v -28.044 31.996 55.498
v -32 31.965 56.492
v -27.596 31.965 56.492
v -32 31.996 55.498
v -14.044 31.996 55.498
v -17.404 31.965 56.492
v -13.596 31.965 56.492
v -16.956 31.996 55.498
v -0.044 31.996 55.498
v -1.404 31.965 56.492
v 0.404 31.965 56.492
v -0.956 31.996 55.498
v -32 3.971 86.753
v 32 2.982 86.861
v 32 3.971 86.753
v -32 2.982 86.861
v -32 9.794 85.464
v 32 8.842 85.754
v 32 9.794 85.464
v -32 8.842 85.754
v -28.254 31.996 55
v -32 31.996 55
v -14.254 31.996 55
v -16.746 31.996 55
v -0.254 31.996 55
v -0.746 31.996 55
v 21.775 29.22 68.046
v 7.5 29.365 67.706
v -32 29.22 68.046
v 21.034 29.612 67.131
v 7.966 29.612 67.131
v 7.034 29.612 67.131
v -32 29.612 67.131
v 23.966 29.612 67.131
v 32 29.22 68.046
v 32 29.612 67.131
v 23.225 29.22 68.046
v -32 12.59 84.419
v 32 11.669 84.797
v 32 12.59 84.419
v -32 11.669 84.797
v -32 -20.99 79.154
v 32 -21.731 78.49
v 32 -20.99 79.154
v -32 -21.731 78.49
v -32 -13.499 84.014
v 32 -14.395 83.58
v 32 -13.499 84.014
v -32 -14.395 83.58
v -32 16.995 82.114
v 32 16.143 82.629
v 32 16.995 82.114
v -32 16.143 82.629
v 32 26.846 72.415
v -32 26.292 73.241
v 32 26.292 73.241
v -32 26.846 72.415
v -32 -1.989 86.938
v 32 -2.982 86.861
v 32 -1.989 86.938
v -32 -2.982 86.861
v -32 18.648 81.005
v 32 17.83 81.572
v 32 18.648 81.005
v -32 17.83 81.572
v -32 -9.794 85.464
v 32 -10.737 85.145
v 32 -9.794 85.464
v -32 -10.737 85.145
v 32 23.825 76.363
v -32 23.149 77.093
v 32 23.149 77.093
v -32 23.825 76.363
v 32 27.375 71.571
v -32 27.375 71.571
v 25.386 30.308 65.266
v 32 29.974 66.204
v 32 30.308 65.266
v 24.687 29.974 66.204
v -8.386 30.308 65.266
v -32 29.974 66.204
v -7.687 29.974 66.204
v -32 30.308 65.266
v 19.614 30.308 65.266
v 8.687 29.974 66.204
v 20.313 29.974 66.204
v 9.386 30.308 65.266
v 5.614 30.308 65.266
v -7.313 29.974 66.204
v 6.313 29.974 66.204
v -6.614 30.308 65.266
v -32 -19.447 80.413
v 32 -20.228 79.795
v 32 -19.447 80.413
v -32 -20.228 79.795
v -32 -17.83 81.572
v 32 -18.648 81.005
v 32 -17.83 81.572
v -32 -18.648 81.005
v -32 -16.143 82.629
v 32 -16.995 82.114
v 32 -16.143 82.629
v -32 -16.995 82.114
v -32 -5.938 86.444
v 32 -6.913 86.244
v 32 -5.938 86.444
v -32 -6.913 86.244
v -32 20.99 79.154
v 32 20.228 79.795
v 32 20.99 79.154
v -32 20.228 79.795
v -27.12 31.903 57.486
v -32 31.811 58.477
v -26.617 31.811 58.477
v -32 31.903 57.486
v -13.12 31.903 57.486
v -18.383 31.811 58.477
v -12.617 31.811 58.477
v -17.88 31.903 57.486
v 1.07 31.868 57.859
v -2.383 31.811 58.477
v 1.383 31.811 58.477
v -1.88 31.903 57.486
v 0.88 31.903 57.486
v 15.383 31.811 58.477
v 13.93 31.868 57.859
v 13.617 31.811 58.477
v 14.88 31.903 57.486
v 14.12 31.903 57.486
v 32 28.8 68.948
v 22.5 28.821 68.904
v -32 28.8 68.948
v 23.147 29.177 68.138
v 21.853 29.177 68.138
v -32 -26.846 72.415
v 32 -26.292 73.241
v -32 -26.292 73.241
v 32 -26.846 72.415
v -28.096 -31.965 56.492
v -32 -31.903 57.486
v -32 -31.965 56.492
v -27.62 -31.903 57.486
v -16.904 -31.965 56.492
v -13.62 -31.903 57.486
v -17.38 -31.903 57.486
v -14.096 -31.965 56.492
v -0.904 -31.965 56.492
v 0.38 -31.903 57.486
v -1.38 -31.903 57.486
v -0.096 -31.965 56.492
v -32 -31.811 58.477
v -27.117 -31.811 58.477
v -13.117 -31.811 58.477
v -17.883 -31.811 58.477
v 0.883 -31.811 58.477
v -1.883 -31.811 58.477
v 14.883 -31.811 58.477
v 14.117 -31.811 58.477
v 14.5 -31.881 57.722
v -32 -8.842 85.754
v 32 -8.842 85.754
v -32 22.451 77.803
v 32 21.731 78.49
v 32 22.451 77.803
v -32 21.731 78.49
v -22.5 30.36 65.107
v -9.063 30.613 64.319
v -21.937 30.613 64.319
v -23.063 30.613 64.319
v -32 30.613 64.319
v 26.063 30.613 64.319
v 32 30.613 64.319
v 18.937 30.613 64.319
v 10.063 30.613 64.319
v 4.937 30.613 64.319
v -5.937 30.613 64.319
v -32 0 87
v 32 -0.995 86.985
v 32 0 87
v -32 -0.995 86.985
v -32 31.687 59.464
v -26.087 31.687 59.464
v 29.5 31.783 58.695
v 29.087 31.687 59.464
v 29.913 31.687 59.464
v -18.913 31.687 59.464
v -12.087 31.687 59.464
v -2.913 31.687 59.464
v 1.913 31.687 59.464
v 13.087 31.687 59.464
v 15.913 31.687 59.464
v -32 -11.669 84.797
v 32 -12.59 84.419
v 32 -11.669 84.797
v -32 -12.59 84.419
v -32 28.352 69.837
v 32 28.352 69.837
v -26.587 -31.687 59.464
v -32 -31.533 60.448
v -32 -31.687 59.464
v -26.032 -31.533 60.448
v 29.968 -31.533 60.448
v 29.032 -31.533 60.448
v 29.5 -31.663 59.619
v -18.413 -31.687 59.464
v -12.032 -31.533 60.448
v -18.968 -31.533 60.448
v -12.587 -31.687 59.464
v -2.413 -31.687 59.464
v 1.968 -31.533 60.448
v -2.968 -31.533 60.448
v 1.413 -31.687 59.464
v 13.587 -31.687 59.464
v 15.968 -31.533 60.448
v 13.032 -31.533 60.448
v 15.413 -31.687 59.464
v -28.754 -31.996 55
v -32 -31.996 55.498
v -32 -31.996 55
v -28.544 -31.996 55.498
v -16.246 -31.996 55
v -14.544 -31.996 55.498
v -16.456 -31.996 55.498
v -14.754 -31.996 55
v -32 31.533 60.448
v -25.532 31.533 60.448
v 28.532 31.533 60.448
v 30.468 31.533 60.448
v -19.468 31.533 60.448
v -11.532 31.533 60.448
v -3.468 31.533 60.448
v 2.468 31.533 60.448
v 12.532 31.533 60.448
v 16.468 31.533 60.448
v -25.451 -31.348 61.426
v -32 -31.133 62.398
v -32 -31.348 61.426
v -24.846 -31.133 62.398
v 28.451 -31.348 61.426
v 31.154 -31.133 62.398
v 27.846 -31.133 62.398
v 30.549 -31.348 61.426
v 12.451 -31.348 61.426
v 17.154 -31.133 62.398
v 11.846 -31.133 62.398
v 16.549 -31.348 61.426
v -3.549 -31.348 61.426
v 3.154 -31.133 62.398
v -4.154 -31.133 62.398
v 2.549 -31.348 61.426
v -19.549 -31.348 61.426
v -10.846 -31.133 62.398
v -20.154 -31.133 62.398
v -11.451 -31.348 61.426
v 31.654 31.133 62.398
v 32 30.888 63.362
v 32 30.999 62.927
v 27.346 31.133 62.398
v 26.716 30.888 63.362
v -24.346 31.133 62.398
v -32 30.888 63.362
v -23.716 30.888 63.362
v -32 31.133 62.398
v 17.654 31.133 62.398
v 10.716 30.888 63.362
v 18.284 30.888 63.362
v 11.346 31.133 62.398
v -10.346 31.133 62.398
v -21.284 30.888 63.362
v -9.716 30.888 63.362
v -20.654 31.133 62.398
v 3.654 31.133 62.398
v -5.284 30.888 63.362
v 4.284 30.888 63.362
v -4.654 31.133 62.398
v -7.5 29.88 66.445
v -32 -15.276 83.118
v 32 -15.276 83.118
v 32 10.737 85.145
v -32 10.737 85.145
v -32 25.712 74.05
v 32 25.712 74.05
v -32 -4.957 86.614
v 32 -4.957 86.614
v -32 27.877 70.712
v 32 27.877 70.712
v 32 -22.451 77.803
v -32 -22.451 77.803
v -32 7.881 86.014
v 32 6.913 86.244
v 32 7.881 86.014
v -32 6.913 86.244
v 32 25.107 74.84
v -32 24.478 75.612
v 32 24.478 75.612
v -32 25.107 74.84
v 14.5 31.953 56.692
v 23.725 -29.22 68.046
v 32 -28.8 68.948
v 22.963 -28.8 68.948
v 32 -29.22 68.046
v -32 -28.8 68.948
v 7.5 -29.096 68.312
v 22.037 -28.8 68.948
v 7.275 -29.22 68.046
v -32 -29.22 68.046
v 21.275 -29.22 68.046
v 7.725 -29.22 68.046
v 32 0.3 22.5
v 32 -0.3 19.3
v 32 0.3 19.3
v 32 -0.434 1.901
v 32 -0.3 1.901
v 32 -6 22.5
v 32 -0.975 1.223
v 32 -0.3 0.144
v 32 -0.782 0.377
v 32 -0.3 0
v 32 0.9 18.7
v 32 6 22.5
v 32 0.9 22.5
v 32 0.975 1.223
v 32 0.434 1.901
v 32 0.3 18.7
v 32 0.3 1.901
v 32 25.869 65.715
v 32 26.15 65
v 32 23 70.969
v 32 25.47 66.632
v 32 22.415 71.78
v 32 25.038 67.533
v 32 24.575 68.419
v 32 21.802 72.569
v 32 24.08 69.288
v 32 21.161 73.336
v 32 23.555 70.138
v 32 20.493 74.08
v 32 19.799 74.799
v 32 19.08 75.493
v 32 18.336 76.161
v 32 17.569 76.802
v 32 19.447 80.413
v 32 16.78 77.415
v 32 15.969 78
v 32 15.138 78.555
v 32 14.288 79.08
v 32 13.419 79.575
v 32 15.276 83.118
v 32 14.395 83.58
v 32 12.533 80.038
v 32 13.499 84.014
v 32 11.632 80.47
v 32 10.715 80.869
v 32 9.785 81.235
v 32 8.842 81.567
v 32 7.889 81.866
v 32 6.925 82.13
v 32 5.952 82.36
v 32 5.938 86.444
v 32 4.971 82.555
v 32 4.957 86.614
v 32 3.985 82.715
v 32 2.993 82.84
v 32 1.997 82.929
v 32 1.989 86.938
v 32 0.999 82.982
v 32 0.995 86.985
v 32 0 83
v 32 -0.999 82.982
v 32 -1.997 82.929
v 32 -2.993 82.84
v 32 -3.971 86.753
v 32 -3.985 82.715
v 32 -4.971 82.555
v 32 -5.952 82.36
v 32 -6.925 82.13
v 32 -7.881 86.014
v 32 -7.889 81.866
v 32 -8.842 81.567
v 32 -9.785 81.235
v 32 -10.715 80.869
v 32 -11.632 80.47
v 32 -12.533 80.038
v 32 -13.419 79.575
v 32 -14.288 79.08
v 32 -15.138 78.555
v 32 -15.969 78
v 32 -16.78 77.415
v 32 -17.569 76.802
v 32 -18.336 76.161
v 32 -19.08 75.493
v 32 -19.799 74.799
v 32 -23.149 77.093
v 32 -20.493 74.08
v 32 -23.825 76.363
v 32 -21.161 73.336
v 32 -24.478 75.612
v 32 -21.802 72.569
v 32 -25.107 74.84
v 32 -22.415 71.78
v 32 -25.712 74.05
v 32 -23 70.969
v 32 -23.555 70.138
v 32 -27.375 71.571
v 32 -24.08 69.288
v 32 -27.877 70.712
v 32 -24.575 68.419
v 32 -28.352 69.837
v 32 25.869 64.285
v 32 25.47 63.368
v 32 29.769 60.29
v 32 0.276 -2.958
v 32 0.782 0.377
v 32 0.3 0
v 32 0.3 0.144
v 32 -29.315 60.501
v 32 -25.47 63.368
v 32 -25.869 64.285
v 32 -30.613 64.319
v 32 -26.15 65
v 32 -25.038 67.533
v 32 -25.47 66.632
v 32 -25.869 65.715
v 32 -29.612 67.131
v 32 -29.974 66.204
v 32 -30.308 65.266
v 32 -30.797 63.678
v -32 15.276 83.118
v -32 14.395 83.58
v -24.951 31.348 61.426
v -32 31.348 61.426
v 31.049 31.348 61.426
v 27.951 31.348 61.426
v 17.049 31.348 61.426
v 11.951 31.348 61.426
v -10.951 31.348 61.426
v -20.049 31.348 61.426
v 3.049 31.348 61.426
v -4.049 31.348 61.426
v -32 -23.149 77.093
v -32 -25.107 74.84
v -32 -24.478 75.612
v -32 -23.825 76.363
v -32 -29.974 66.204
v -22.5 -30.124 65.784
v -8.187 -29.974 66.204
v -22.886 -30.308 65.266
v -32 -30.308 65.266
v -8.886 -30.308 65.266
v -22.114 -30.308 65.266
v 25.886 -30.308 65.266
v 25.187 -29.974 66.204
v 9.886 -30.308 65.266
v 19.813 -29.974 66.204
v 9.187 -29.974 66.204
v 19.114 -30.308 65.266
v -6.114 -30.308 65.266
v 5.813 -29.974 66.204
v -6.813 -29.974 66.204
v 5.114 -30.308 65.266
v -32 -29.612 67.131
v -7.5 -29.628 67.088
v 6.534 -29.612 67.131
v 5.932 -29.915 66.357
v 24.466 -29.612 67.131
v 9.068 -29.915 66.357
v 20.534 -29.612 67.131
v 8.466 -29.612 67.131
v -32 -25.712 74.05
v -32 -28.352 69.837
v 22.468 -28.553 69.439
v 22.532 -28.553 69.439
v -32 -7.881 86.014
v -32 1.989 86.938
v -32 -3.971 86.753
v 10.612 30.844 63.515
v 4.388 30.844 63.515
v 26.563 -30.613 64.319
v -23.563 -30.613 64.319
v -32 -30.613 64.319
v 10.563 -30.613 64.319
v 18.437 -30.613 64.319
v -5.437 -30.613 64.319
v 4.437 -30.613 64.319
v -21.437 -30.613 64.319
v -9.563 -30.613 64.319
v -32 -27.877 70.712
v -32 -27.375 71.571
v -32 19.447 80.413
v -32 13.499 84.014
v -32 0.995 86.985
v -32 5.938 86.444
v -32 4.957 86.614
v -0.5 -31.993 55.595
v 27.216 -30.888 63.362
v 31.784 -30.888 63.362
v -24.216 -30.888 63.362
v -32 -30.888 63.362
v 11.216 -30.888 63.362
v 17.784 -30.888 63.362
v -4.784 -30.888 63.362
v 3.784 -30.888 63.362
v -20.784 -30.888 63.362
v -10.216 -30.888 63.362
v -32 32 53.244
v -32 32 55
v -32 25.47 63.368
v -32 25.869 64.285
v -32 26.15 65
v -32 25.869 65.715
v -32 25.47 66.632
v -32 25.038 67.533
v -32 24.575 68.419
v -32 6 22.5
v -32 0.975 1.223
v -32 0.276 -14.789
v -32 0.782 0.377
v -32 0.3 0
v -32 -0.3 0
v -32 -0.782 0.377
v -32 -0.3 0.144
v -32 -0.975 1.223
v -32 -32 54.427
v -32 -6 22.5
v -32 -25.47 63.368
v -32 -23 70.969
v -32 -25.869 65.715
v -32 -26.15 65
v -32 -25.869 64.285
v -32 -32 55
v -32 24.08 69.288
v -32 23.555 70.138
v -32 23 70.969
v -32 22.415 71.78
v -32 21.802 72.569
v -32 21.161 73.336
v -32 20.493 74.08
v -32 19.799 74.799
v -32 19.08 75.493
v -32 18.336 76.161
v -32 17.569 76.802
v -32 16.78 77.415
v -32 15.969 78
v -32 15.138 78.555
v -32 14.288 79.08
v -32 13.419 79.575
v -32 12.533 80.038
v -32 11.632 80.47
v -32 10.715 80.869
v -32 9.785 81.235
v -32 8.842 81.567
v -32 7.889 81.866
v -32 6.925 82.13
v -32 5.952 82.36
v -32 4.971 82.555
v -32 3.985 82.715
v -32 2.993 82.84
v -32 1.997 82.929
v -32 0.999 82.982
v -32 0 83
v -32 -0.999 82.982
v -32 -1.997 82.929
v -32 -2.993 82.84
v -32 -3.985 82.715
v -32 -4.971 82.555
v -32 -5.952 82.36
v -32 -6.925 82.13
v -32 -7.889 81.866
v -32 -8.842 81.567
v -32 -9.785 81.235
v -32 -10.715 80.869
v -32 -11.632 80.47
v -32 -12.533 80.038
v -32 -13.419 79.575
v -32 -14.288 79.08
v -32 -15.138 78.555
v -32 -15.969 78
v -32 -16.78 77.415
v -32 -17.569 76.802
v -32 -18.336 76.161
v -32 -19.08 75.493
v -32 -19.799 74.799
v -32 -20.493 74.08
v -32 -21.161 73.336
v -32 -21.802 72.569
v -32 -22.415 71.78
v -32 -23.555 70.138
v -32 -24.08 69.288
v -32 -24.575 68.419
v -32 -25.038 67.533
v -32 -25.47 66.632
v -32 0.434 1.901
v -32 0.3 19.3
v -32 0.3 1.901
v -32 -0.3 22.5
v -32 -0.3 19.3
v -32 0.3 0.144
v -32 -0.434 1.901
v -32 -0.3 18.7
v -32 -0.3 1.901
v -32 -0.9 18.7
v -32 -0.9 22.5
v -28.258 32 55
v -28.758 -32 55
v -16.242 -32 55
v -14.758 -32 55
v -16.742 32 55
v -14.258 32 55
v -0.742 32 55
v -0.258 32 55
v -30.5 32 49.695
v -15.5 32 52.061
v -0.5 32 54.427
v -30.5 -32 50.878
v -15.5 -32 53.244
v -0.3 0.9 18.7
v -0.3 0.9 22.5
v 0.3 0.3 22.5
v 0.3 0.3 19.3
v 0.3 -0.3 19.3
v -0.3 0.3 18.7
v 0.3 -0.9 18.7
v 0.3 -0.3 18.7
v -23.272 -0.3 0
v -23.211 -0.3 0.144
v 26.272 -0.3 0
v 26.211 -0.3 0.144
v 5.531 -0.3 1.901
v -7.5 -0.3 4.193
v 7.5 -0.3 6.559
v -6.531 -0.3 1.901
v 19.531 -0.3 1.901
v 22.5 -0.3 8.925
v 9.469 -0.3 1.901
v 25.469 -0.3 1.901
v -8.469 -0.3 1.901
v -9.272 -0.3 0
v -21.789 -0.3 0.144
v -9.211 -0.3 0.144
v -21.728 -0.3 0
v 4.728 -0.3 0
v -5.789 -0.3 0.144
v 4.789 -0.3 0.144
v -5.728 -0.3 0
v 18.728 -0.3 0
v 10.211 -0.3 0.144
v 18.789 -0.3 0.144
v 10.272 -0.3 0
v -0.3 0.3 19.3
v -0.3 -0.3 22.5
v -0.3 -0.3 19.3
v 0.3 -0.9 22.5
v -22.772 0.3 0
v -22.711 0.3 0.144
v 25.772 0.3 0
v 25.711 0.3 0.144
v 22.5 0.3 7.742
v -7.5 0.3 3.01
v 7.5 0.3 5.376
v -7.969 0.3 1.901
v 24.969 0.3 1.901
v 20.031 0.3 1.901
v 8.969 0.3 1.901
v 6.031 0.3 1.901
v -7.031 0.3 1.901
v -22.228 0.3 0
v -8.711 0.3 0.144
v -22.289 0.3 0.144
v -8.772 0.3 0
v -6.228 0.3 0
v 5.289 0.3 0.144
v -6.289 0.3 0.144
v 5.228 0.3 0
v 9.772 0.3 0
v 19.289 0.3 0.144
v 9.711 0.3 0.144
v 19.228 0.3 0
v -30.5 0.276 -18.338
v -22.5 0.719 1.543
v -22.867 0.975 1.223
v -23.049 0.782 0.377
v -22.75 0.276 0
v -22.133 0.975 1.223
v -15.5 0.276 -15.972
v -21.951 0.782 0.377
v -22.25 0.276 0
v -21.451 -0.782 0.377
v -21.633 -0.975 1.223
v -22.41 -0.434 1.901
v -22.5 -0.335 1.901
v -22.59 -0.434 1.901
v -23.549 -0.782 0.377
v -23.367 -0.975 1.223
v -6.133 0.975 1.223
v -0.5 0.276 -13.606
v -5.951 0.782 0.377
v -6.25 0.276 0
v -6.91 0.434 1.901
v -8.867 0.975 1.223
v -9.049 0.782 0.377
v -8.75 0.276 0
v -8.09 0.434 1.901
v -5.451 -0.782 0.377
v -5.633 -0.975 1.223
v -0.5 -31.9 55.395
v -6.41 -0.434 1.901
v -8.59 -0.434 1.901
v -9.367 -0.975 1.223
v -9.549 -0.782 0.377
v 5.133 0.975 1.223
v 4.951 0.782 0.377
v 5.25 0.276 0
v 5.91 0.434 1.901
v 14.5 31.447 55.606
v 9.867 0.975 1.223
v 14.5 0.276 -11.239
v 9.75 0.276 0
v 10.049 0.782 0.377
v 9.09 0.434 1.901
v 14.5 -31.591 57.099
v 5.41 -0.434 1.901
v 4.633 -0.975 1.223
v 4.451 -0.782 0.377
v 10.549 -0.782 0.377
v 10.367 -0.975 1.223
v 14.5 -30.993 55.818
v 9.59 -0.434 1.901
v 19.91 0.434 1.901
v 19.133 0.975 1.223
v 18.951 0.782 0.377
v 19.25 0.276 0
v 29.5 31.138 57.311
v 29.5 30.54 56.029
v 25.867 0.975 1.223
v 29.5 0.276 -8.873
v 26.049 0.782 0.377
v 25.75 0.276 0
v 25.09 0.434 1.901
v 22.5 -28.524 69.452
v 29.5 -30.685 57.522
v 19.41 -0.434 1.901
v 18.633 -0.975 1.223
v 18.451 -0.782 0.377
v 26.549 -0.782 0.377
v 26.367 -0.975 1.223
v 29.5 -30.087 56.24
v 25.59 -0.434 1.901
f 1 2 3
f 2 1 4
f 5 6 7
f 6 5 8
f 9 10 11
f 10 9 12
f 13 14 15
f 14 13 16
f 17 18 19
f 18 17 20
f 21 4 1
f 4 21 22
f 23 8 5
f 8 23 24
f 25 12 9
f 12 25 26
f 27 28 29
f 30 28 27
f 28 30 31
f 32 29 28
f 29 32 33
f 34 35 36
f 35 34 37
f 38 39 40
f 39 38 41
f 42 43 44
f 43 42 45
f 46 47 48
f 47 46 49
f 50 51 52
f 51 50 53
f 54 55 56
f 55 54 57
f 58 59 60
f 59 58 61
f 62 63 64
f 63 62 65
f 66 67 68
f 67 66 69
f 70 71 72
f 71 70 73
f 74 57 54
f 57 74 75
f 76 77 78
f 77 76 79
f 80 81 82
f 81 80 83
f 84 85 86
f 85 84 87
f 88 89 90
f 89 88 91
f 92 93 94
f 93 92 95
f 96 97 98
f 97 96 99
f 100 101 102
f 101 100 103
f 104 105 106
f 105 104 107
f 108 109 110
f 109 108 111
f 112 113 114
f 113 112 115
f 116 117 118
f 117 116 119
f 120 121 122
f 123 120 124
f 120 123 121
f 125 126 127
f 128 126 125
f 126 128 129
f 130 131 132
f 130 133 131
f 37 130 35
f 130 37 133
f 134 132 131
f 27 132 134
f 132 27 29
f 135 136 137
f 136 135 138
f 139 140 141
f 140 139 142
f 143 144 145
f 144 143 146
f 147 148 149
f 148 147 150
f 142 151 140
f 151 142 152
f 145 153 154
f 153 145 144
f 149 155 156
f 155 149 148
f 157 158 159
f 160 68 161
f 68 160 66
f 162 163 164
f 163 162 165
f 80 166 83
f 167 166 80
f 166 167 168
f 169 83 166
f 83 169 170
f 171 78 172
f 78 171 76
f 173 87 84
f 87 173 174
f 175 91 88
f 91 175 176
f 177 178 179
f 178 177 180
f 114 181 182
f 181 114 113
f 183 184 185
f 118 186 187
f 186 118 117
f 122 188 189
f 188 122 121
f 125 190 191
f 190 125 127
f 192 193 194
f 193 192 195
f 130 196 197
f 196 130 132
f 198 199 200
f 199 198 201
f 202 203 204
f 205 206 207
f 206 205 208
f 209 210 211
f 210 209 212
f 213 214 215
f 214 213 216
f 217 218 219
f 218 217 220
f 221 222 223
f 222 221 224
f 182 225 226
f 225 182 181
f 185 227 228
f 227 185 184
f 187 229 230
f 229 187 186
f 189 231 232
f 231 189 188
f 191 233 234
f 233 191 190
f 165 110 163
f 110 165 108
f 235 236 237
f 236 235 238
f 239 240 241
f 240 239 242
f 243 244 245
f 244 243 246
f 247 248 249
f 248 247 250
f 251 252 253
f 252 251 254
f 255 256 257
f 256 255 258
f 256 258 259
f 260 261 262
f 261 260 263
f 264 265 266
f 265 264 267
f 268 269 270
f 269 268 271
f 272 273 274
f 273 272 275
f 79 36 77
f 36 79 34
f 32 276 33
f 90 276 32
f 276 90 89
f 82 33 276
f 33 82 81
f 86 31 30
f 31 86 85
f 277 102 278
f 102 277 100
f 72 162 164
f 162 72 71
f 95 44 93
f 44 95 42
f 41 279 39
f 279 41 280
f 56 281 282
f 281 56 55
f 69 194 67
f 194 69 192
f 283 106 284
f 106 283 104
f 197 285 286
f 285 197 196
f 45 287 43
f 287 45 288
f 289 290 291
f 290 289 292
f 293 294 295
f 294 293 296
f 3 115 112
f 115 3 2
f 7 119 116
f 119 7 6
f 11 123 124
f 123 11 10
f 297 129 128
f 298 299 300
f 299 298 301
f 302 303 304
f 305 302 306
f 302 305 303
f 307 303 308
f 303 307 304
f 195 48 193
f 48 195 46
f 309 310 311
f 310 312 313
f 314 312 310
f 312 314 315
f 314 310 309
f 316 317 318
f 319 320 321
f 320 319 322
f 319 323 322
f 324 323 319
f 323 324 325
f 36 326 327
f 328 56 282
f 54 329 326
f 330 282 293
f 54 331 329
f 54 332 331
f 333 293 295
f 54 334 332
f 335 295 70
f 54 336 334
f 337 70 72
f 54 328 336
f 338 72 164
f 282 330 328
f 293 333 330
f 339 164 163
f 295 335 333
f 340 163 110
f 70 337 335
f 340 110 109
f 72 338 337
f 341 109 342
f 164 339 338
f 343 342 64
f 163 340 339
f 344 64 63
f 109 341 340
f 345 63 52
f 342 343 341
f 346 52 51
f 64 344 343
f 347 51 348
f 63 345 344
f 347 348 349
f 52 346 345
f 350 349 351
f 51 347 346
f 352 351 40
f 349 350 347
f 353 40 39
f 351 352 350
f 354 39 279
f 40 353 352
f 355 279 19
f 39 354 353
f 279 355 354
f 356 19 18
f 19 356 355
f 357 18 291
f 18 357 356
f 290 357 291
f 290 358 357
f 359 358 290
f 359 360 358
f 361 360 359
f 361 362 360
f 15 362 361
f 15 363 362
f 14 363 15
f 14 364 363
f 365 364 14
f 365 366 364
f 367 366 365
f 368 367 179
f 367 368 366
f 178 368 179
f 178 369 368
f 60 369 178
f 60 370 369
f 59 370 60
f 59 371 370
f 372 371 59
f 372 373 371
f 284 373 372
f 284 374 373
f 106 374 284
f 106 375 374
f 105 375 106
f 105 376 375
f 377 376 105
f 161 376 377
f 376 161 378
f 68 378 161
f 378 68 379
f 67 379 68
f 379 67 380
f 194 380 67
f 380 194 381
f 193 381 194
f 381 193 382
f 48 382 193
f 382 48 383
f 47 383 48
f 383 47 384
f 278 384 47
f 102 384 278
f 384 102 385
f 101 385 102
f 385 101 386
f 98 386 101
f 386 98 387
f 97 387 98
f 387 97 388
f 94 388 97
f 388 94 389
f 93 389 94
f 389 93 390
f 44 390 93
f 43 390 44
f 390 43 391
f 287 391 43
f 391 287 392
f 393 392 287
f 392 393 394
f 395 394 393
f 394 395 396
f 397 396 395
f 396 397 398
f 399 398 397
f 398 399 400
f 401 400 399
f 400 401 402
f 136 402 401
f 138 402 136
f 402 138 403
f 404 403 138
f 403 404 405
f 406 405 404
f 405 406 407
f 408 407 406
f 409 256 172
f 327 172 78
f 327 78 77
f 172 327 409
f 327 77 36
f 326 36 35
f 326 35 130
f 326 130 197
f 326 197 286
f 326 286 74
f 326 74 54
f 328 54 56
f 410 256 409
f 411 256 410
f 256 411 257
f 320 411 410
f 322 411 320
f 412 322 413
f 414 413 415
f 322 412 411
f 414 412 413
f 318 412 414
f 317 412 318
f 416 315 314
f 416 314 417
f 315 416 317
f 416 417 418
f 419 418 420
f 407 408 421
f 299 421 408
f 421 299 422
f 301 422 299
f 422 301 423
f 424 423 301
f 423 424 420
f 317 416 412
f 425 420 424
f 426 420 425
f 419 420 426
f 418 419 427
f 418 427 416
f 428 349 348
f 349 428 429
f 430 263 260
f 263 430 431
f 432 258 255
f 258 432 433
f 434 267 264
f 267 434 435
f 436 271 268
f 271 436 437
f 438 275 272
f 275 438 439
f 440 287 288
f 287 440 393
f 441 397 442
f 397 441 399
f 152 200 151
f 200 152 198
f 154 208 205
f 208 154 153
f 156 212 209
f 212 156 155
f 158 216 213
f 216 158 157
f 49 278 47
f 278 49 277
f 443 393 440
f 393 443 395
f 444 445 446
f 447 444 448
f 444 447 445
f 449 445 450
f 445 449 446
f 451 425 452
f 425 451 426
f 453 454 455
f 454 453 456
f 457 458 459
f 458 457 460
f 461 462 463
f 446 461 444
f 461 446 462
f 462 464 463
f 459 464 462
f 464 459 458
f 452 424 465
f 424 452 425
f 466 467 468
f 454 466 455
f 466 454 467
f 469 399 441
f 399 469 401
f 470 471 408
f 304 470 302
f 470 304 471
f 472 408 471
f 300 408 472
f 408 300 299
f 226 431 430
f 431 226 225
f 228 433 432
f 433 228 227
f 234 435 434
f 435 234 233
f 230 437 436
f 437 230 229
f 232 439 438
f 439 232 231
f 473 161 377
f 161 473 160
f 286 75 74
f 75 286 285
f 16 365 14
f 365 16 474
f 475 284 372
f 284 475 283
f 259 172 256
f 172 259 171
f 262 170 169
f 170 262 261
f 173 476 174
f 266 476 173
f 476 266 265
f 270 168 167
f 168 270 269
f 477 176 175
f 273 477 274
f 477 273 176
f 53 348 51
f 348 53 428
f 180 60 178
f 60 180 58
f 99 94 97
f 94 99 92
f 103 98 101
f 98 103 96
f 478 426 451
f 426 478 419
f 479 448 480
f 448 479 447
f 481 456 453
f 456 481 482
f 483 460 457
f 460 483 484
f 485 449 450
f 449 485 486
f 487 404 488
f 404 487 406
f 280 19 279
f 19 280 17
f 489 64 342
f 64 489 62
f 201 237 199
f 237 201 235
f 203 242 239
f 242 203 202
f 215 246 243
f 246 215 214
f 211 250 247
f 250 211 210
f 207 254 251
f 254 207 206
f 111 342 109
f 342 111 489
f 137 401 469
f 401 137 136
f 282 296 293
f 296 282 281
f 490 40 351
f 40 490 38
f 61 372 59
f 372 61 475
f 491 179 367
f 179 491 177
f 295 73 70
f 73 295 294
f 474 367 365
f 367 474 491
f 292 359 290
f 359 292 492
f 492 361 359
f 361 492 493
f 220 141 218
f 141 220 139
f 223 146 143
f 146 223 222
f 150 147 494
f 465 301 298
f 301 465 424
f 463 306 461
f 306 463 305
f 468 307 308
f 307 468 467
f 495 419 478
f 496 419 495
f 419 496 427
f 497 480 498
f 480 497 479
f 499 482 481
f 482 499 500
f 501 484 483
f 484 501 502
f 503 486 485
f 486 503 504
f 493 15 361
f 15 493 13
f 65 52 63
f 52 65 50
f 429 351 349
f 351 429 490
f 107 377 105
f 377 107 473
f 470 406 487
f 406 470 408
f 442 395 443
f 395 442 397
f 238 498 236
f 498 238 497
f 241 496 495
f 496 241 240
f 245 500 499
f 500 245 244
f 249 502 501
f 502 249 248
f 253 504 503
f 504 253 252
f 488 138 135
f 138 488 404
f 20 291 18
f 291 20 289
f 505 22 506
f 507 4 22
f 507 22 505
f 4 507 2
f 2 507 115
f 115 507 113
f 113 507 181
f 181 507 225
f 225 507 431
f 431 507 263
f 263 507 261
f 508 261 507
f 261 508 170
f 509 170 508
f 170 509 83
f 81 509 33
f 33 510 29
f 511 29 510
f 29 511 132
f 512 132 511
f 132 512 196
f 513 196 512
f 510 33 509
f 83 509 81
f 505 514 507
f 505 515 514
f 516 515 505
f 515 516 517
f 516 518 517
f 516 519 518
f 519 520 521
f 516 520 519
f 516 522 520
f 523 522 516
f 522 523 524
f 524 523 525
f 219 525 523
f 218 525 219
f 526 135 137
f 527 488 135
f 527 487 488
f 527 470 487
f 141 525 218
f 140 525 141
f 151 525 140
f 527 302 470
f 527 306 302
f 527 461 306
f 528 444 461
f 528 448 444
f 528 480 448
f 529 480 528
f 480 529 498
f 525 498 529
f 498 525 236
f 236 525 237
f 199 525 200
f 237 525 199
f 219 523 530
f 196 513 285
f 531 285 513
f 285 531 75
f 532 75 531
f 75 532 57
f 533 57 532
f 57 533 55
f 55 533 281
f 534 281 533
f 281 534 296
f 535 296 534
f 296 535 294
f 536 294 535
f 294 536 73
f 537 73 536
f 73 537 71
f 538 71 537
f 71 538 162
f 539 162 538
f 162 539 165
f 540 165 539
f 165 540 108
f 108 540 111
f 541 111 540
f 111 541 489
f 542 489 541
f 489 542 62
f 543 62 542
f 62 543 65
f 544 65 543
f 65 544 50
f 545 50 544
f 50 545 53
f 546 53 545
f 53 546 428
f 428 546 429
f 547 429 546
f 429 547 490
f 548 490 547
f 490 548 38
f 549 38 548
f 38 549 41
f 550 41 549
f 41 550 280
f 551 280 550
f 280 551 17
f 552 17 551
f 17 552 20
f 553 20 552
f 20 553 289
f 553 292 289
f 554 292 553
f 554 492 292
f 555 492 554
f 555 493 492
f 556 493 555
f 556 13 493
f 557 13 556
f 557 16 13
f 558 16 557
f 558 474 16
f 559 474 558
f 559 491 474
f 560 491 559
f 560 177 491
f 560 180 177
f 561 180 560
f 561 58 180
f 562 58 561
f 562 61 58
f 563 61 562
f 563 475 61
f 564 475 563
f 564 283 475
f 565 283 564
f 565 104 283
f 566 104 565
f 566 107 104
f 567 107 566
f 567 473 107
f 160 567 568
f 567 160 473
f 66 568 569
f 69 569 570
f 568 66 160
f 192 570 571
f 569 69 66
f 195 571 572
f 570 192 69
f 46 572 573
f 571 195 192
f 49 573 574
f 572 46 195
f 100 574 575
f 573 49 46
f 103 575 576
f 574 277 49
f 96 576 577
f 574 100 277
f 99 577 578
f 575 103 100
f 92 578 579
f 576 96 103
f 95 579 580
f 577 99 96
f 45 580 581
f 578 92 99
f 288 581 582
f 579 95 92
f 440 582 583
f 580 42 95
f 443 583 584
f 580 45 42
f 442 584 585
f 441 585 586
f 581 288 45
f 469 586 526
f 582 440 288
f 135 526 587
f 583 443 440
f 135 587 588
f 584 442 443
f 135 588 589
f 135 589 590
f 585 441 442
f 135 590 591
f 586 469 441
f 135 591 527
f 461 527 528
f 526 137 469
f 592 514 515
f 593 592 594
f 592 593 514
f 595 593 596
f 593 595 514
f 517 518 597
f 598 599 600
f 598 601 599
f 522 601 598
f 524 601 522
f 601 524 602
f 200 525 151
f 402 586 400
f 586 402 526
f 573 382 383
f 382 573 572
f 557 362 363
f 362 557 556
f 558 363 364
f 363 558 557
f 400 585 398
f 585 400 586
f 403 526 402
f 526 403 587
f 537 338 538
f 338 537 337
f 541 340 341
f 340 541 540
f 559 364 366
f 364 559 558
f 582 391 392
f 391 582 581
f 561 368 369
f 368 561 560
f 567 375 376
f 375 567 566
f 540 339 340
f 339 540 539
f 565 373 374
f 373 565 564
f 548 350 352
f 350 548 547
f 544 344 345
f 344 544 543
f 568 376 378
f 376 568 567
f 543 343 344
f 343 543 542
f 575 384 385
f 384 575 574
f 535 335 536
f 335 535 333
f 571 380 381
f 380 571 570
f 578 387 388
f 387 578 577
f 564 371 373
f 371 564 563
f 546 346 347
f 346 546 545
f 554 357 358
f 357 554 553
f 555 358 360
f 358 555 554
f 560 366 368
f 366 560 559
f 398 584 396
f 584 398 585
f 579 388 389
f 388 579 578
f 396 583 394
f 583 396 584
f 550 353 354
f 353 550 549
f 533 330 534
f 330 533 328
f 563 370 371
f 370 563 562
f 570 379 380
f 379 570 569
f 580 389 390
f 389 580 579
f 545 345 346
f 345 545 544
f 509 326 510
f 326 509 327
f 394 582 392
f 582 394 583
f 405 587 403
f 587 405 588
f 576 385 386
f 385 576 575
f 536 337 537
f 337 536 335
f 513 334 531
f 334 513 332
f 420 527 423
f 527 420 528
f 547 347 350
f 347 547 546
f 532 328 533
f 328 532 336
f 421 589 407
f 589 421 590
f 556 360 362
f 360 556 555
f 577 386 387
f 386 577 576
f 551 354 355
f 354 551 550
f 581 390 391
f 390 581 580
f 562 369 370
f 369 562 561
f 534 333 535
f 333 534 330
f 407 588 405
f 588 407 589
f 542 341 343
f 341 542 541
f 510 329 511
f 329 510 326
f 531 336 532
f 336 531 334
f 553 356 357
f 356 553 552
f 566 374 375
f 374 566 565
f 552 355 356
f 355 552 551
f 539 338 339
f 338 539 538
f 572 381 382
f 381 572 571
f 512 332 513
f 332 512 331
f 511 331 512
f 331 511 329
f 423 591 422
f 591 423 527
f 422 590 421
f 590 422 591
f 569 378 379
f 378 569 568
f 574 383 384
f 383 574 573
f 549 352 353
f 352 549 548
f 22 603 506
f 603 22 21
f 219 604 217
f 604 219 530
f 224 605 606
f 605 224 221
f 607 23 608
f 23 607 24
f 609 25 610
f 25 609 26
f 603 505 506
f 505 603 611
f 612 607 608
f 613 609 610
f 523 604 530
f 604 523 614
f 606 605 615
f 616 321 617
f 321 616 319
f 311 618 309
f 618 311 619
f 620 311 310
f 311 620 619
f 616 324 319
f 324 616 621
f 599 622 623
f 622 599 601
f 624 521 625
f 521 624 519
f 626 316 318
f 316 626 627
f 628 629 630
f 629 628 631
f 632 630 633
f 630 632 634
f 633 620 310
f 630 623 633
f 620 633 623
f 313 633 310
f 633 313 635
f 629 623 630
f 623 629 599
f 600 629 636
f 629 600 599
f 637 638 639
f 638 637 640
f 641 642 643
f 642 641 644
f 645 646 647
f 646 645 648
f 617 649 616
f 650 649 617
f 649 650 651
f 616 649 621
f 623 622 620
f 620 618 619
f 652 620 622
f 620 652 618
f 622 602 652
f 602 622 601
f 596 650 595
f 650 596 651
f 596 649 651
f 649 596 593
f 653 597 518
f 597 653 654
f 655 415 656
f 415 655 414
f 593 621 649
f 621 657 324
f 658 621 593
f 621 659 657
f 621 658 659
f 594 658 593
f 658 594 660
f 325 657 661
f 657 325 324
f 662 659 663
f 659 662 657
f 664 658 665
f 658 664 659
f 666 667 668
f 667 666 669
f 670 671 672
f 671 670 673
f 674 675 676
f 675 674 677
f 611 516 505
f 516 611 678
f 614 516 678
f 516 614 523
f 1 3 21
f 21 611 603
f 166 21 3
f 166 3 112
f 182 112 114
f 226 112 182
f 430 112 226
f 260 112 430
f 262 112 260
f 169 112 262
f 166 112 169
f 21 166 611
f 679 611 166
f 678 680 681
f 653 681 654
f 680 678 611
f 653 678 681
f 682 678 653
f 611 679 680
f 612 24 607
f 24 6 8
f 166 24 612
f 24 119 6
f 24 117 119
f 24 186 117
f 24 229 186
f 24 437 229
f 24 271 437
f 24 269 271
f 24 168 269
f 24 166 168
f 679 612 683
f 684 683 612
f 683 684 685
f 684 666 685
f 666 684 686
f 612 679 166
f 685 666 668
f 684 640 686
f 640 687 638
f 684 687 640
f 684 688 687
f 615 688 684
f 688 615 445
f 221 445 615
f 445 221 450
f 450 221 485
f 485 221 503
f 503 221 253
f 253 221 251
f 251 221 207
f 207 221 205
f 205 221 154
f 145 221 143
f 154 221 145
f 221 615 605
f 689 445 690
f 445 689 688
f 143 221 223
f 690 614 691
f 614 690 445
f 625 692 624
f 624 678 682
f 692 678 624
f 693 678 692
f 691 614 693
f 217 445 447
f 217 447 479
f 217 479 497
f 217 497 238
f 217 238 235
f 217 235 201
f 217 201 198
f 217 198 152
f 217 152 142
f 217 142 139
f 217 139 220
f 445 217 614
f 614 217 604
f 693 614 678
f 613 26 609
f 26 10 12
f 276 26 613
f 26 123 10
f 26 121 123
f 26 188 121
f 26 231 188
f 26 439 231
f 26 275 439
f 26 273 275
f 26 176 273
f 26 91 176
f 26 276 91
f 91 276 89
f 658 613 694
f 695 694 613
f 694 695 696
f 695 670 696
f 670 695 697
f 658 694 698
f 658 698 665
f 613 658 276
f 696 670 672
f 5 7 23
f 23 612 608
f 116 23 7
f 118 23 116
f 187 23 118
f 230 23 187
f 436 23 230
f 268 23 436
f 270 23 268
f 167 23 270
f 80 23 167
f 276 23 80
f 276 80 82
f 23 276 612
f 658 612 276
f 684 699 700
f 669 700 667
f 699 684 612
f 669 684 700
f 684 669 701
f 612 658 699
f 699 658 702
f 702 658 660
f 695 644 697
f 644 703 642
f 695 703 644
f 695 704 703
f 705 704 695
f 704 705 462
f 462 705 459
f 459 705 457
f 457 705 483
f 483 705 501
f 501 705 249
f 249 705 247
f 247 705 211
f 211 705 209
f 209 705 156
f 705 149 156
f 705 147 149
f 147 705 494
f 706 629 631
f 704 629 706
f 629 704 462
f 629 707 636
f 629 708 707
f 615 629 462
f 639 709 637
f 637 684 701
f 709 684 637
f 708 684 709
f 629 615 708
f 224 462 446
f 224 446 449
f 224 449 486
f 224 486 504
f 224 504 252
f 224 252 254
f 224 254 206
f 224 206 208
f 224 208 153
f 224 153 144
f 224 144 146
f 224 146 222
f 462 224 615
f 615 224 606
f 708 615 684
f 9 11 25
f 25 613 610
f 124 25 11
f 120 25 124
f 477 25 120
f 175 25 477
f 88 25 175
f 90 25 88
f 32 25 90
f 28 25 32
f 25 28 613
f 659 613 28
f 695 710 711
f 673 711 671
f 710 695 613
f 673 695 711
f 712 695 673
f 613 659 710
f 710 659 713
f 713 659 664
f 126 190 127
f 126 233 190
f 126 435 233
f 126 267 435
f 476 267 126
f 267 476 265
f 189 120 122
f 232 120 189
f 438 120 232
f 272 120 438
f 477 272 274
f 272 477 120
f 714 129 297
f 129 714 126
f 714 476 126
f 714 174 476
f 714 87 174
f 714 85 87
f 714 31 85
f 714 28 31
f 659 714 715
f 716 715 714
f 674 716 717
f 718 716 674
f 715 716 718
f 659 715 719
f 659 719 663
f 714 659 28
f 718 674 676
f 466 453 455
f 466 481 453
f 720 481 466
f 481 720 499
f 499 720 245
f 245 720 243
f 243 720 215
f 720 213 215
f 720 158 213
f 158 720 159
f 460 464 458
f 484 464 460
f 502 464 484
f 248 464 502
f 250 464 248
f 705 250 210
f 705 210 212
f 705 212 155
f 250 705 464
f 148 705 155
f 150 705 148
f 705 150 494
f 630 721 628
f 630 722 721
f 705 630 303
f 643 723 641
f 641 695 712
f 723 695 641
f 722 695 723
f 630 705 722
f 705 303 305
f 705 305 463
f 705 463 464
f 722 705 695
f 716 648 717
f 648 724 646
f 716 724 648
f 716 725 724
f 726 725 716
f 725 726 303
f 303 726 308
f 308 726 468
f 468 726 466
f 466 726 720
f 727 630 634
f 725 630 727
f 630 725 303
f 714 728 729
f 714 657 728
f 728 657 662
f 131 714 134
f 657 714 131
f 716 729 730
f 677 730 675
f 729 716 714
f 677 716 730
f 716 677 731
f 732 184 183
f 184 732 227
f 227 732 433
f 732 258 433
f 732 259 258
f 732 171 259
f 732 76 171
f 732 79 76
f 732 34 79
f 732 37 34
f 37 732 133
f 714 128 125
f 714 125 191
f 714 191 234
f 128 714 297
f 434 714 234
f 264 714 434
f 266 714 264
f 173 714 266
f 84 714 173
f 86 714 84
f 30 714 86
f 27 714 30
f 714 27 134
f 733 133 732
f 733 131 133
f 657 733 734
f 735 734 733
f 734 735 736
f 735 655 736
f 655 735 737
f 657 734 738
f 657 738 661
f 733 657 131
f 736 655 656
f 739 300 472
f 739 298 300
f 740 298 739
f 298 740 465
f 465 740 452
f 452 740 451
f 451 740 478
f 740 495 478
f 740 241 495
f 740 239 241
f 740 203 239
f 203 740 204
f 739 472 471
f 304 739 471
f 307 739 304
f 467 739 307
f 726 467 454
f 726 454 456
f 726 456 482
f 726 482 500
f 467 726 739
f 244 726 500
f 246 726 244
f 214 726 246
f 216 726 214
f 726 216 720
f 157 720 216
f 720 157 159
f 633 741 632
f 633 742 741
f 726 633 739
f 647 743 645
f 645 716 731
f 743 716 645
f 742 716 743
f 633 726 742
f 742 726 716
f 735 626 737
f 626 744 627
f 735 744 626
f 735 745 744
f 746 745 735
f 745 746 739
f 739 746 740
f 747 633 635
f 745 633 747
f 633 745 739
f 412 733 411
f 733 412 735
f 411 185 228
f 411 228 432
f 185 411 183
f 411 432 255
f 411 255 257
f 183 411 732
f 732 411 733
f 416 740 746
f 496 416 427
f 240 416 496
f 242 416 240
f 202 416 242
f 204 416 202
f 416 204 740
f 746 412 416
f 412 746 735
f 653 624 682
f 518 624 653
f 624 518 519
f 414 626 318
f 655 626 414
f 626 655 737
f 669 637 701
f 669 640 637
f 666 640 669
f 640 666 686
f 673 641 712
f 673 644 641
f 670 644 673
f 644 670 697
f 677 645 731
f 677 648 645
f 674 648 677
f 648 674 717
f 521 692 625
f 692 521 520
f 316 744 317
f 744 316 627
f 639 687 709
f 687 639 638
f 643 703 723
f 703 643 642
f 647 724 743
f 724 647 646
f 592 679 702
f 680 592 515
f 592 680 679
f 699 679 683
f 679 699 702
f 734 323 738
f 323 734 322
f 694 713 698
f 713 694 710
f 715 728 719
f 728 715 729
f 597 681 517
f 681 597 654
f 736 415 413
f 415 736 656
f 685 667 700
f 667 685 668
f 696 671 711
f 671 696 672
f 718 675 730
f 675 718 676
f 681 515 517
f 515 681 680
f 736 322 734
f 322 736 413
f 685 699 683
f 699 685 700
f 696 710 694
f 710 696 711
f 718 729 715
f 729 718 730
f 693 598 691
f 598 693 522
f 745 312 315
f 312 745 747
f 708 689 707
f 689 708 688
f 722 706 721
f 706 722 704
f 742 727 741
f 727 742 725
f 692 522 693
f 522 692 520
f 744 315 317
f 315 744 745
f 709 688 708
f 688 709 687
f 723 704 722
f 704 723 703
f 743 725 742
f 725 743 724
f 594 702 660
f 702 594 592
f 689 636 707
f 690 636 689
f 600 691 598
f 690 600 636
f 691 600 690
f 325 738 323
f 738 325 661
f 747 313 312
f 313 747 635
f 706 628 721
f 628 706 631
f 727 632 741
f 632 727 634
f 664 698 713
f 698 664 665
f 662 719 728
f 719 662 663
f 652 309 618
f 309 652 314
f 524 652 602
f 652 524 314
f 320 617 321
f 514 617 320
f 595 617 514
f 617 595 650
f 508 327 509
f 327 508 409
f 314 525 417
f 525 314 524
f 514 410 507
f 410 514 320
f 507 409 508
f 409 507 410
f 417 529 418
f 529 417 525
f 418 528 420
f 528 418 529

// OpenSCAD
$fa=.01;
$fs=1;

width = 64;
length = 30;
height = 110;
twt=4;

bladeWidth1 = 60;
bladeWidth2 = 31;
bladeHeight = 19;
bladeThickness = .6;

module mirror2(xyz) {
  children();
  mirror(xyz) children();
}
module rotate2(xyz,n=2){
  for(i=[0:n-1])
    rotate(360*i/n,xyz)
      children();
}

module sequentialHull(){
    if($children==1){
      children();
    } else if($children>0) for (i = [0: $children-2])
        hull(){
            children(i);
            children(i+1);
        }
}

module squentialHull(){
  groups=[[1,2,3,4],[3,4,5,6],[5,6,7,8]];
  for(i=[0:len(groups)-1]){
  hull()
    for(j=[0:3]){
      children(groups[i][j]);
    }
  }
}

module blade() {
  linear_extrude(.6, center = true) {
    polygon([
        [-bladeWidth1 / 2, 0],
        [bladeWidth1 / 2, 0],
        [bladeWidth2 / 2, bladeHeight],
        [-bladeWidth2 / 2, bladeHeight]
      ]);
  }
}

module main(){
  %rotate([90,0,0]) blade();
  big=150;
  ds=[.5,1,2,3];
  difference(){
    union(){
     translate([0,0,height/2])rotate([0,90,0]) difference(){
       cylinder(d=width,h=width,center=true);
       cylinder(d=width-2*twt,h=width+2,center=true);
     }
      cube([width,width,height], center=true);
      intersection(){
        translate([0,0,height/2])rotate([0,90,0])  cylinder(d=width,h=width,center=true);
        cube([width,width,height+20], center=true);
      }
    }
    //blade gap
    //rotate([90,0,0]) blade();
    linear_extrude(bladeHeight)square([width+2,bladeThickness], center=true);
    translate([0,0,1])rotate([0,90,0]) cylinder(d=2,h=width+2, center=true);

    //locking mechanism
    rotate2([0,0,1]) translate([0,0,bladeHeight])#union(){
      translate([0,bladeThickness/2,0])cube([width/2+2,bladeThickness,15]);
      translate([0,-bladeThickness/2,-bladeThickness/2]) cube([width/2+2,bladeThickness*2,bladeThickness]);
      translate([0,0,-bladeThickness/2])linear_extrude(15) square([bladeThickness,bladeThickness*3], center=true);
    }

    n=4;
    //channels
    for(i=[-1:n]) {
      translate([-bladeWidth1 / 2 + bladeWidth1 * (i+.5)/n, 0, 0])
        rotate([-25, 0, 0])
          translate([0, -i, 0])
            rotate(45)
              translate([0, 0, -big / 2])
                cube(big);
      translate([-bladeWidth1 / 2 + bladeWidth1 * (i+.5)/n, 0, 0])
        rotate([25, 0, 0])
          translate([0, i+.5, 0])
            rotate(45+180)
              translate([0, 0, -big / 2])
                cube(big);
    }
    //side grips
    translate([0,0,height/2]) rotate([0,90,0]) linear_extrude(width+.2, center=true) minkowski(){
      ddd=width-2*twt;
      hull(){

      intersection(){
        circle(d=ddd);
        translate([-20,0]) circle(d=ddd);
      }
        translate([32,0]) square([1,12], center=true);
      }
    }
  }
}
main();
